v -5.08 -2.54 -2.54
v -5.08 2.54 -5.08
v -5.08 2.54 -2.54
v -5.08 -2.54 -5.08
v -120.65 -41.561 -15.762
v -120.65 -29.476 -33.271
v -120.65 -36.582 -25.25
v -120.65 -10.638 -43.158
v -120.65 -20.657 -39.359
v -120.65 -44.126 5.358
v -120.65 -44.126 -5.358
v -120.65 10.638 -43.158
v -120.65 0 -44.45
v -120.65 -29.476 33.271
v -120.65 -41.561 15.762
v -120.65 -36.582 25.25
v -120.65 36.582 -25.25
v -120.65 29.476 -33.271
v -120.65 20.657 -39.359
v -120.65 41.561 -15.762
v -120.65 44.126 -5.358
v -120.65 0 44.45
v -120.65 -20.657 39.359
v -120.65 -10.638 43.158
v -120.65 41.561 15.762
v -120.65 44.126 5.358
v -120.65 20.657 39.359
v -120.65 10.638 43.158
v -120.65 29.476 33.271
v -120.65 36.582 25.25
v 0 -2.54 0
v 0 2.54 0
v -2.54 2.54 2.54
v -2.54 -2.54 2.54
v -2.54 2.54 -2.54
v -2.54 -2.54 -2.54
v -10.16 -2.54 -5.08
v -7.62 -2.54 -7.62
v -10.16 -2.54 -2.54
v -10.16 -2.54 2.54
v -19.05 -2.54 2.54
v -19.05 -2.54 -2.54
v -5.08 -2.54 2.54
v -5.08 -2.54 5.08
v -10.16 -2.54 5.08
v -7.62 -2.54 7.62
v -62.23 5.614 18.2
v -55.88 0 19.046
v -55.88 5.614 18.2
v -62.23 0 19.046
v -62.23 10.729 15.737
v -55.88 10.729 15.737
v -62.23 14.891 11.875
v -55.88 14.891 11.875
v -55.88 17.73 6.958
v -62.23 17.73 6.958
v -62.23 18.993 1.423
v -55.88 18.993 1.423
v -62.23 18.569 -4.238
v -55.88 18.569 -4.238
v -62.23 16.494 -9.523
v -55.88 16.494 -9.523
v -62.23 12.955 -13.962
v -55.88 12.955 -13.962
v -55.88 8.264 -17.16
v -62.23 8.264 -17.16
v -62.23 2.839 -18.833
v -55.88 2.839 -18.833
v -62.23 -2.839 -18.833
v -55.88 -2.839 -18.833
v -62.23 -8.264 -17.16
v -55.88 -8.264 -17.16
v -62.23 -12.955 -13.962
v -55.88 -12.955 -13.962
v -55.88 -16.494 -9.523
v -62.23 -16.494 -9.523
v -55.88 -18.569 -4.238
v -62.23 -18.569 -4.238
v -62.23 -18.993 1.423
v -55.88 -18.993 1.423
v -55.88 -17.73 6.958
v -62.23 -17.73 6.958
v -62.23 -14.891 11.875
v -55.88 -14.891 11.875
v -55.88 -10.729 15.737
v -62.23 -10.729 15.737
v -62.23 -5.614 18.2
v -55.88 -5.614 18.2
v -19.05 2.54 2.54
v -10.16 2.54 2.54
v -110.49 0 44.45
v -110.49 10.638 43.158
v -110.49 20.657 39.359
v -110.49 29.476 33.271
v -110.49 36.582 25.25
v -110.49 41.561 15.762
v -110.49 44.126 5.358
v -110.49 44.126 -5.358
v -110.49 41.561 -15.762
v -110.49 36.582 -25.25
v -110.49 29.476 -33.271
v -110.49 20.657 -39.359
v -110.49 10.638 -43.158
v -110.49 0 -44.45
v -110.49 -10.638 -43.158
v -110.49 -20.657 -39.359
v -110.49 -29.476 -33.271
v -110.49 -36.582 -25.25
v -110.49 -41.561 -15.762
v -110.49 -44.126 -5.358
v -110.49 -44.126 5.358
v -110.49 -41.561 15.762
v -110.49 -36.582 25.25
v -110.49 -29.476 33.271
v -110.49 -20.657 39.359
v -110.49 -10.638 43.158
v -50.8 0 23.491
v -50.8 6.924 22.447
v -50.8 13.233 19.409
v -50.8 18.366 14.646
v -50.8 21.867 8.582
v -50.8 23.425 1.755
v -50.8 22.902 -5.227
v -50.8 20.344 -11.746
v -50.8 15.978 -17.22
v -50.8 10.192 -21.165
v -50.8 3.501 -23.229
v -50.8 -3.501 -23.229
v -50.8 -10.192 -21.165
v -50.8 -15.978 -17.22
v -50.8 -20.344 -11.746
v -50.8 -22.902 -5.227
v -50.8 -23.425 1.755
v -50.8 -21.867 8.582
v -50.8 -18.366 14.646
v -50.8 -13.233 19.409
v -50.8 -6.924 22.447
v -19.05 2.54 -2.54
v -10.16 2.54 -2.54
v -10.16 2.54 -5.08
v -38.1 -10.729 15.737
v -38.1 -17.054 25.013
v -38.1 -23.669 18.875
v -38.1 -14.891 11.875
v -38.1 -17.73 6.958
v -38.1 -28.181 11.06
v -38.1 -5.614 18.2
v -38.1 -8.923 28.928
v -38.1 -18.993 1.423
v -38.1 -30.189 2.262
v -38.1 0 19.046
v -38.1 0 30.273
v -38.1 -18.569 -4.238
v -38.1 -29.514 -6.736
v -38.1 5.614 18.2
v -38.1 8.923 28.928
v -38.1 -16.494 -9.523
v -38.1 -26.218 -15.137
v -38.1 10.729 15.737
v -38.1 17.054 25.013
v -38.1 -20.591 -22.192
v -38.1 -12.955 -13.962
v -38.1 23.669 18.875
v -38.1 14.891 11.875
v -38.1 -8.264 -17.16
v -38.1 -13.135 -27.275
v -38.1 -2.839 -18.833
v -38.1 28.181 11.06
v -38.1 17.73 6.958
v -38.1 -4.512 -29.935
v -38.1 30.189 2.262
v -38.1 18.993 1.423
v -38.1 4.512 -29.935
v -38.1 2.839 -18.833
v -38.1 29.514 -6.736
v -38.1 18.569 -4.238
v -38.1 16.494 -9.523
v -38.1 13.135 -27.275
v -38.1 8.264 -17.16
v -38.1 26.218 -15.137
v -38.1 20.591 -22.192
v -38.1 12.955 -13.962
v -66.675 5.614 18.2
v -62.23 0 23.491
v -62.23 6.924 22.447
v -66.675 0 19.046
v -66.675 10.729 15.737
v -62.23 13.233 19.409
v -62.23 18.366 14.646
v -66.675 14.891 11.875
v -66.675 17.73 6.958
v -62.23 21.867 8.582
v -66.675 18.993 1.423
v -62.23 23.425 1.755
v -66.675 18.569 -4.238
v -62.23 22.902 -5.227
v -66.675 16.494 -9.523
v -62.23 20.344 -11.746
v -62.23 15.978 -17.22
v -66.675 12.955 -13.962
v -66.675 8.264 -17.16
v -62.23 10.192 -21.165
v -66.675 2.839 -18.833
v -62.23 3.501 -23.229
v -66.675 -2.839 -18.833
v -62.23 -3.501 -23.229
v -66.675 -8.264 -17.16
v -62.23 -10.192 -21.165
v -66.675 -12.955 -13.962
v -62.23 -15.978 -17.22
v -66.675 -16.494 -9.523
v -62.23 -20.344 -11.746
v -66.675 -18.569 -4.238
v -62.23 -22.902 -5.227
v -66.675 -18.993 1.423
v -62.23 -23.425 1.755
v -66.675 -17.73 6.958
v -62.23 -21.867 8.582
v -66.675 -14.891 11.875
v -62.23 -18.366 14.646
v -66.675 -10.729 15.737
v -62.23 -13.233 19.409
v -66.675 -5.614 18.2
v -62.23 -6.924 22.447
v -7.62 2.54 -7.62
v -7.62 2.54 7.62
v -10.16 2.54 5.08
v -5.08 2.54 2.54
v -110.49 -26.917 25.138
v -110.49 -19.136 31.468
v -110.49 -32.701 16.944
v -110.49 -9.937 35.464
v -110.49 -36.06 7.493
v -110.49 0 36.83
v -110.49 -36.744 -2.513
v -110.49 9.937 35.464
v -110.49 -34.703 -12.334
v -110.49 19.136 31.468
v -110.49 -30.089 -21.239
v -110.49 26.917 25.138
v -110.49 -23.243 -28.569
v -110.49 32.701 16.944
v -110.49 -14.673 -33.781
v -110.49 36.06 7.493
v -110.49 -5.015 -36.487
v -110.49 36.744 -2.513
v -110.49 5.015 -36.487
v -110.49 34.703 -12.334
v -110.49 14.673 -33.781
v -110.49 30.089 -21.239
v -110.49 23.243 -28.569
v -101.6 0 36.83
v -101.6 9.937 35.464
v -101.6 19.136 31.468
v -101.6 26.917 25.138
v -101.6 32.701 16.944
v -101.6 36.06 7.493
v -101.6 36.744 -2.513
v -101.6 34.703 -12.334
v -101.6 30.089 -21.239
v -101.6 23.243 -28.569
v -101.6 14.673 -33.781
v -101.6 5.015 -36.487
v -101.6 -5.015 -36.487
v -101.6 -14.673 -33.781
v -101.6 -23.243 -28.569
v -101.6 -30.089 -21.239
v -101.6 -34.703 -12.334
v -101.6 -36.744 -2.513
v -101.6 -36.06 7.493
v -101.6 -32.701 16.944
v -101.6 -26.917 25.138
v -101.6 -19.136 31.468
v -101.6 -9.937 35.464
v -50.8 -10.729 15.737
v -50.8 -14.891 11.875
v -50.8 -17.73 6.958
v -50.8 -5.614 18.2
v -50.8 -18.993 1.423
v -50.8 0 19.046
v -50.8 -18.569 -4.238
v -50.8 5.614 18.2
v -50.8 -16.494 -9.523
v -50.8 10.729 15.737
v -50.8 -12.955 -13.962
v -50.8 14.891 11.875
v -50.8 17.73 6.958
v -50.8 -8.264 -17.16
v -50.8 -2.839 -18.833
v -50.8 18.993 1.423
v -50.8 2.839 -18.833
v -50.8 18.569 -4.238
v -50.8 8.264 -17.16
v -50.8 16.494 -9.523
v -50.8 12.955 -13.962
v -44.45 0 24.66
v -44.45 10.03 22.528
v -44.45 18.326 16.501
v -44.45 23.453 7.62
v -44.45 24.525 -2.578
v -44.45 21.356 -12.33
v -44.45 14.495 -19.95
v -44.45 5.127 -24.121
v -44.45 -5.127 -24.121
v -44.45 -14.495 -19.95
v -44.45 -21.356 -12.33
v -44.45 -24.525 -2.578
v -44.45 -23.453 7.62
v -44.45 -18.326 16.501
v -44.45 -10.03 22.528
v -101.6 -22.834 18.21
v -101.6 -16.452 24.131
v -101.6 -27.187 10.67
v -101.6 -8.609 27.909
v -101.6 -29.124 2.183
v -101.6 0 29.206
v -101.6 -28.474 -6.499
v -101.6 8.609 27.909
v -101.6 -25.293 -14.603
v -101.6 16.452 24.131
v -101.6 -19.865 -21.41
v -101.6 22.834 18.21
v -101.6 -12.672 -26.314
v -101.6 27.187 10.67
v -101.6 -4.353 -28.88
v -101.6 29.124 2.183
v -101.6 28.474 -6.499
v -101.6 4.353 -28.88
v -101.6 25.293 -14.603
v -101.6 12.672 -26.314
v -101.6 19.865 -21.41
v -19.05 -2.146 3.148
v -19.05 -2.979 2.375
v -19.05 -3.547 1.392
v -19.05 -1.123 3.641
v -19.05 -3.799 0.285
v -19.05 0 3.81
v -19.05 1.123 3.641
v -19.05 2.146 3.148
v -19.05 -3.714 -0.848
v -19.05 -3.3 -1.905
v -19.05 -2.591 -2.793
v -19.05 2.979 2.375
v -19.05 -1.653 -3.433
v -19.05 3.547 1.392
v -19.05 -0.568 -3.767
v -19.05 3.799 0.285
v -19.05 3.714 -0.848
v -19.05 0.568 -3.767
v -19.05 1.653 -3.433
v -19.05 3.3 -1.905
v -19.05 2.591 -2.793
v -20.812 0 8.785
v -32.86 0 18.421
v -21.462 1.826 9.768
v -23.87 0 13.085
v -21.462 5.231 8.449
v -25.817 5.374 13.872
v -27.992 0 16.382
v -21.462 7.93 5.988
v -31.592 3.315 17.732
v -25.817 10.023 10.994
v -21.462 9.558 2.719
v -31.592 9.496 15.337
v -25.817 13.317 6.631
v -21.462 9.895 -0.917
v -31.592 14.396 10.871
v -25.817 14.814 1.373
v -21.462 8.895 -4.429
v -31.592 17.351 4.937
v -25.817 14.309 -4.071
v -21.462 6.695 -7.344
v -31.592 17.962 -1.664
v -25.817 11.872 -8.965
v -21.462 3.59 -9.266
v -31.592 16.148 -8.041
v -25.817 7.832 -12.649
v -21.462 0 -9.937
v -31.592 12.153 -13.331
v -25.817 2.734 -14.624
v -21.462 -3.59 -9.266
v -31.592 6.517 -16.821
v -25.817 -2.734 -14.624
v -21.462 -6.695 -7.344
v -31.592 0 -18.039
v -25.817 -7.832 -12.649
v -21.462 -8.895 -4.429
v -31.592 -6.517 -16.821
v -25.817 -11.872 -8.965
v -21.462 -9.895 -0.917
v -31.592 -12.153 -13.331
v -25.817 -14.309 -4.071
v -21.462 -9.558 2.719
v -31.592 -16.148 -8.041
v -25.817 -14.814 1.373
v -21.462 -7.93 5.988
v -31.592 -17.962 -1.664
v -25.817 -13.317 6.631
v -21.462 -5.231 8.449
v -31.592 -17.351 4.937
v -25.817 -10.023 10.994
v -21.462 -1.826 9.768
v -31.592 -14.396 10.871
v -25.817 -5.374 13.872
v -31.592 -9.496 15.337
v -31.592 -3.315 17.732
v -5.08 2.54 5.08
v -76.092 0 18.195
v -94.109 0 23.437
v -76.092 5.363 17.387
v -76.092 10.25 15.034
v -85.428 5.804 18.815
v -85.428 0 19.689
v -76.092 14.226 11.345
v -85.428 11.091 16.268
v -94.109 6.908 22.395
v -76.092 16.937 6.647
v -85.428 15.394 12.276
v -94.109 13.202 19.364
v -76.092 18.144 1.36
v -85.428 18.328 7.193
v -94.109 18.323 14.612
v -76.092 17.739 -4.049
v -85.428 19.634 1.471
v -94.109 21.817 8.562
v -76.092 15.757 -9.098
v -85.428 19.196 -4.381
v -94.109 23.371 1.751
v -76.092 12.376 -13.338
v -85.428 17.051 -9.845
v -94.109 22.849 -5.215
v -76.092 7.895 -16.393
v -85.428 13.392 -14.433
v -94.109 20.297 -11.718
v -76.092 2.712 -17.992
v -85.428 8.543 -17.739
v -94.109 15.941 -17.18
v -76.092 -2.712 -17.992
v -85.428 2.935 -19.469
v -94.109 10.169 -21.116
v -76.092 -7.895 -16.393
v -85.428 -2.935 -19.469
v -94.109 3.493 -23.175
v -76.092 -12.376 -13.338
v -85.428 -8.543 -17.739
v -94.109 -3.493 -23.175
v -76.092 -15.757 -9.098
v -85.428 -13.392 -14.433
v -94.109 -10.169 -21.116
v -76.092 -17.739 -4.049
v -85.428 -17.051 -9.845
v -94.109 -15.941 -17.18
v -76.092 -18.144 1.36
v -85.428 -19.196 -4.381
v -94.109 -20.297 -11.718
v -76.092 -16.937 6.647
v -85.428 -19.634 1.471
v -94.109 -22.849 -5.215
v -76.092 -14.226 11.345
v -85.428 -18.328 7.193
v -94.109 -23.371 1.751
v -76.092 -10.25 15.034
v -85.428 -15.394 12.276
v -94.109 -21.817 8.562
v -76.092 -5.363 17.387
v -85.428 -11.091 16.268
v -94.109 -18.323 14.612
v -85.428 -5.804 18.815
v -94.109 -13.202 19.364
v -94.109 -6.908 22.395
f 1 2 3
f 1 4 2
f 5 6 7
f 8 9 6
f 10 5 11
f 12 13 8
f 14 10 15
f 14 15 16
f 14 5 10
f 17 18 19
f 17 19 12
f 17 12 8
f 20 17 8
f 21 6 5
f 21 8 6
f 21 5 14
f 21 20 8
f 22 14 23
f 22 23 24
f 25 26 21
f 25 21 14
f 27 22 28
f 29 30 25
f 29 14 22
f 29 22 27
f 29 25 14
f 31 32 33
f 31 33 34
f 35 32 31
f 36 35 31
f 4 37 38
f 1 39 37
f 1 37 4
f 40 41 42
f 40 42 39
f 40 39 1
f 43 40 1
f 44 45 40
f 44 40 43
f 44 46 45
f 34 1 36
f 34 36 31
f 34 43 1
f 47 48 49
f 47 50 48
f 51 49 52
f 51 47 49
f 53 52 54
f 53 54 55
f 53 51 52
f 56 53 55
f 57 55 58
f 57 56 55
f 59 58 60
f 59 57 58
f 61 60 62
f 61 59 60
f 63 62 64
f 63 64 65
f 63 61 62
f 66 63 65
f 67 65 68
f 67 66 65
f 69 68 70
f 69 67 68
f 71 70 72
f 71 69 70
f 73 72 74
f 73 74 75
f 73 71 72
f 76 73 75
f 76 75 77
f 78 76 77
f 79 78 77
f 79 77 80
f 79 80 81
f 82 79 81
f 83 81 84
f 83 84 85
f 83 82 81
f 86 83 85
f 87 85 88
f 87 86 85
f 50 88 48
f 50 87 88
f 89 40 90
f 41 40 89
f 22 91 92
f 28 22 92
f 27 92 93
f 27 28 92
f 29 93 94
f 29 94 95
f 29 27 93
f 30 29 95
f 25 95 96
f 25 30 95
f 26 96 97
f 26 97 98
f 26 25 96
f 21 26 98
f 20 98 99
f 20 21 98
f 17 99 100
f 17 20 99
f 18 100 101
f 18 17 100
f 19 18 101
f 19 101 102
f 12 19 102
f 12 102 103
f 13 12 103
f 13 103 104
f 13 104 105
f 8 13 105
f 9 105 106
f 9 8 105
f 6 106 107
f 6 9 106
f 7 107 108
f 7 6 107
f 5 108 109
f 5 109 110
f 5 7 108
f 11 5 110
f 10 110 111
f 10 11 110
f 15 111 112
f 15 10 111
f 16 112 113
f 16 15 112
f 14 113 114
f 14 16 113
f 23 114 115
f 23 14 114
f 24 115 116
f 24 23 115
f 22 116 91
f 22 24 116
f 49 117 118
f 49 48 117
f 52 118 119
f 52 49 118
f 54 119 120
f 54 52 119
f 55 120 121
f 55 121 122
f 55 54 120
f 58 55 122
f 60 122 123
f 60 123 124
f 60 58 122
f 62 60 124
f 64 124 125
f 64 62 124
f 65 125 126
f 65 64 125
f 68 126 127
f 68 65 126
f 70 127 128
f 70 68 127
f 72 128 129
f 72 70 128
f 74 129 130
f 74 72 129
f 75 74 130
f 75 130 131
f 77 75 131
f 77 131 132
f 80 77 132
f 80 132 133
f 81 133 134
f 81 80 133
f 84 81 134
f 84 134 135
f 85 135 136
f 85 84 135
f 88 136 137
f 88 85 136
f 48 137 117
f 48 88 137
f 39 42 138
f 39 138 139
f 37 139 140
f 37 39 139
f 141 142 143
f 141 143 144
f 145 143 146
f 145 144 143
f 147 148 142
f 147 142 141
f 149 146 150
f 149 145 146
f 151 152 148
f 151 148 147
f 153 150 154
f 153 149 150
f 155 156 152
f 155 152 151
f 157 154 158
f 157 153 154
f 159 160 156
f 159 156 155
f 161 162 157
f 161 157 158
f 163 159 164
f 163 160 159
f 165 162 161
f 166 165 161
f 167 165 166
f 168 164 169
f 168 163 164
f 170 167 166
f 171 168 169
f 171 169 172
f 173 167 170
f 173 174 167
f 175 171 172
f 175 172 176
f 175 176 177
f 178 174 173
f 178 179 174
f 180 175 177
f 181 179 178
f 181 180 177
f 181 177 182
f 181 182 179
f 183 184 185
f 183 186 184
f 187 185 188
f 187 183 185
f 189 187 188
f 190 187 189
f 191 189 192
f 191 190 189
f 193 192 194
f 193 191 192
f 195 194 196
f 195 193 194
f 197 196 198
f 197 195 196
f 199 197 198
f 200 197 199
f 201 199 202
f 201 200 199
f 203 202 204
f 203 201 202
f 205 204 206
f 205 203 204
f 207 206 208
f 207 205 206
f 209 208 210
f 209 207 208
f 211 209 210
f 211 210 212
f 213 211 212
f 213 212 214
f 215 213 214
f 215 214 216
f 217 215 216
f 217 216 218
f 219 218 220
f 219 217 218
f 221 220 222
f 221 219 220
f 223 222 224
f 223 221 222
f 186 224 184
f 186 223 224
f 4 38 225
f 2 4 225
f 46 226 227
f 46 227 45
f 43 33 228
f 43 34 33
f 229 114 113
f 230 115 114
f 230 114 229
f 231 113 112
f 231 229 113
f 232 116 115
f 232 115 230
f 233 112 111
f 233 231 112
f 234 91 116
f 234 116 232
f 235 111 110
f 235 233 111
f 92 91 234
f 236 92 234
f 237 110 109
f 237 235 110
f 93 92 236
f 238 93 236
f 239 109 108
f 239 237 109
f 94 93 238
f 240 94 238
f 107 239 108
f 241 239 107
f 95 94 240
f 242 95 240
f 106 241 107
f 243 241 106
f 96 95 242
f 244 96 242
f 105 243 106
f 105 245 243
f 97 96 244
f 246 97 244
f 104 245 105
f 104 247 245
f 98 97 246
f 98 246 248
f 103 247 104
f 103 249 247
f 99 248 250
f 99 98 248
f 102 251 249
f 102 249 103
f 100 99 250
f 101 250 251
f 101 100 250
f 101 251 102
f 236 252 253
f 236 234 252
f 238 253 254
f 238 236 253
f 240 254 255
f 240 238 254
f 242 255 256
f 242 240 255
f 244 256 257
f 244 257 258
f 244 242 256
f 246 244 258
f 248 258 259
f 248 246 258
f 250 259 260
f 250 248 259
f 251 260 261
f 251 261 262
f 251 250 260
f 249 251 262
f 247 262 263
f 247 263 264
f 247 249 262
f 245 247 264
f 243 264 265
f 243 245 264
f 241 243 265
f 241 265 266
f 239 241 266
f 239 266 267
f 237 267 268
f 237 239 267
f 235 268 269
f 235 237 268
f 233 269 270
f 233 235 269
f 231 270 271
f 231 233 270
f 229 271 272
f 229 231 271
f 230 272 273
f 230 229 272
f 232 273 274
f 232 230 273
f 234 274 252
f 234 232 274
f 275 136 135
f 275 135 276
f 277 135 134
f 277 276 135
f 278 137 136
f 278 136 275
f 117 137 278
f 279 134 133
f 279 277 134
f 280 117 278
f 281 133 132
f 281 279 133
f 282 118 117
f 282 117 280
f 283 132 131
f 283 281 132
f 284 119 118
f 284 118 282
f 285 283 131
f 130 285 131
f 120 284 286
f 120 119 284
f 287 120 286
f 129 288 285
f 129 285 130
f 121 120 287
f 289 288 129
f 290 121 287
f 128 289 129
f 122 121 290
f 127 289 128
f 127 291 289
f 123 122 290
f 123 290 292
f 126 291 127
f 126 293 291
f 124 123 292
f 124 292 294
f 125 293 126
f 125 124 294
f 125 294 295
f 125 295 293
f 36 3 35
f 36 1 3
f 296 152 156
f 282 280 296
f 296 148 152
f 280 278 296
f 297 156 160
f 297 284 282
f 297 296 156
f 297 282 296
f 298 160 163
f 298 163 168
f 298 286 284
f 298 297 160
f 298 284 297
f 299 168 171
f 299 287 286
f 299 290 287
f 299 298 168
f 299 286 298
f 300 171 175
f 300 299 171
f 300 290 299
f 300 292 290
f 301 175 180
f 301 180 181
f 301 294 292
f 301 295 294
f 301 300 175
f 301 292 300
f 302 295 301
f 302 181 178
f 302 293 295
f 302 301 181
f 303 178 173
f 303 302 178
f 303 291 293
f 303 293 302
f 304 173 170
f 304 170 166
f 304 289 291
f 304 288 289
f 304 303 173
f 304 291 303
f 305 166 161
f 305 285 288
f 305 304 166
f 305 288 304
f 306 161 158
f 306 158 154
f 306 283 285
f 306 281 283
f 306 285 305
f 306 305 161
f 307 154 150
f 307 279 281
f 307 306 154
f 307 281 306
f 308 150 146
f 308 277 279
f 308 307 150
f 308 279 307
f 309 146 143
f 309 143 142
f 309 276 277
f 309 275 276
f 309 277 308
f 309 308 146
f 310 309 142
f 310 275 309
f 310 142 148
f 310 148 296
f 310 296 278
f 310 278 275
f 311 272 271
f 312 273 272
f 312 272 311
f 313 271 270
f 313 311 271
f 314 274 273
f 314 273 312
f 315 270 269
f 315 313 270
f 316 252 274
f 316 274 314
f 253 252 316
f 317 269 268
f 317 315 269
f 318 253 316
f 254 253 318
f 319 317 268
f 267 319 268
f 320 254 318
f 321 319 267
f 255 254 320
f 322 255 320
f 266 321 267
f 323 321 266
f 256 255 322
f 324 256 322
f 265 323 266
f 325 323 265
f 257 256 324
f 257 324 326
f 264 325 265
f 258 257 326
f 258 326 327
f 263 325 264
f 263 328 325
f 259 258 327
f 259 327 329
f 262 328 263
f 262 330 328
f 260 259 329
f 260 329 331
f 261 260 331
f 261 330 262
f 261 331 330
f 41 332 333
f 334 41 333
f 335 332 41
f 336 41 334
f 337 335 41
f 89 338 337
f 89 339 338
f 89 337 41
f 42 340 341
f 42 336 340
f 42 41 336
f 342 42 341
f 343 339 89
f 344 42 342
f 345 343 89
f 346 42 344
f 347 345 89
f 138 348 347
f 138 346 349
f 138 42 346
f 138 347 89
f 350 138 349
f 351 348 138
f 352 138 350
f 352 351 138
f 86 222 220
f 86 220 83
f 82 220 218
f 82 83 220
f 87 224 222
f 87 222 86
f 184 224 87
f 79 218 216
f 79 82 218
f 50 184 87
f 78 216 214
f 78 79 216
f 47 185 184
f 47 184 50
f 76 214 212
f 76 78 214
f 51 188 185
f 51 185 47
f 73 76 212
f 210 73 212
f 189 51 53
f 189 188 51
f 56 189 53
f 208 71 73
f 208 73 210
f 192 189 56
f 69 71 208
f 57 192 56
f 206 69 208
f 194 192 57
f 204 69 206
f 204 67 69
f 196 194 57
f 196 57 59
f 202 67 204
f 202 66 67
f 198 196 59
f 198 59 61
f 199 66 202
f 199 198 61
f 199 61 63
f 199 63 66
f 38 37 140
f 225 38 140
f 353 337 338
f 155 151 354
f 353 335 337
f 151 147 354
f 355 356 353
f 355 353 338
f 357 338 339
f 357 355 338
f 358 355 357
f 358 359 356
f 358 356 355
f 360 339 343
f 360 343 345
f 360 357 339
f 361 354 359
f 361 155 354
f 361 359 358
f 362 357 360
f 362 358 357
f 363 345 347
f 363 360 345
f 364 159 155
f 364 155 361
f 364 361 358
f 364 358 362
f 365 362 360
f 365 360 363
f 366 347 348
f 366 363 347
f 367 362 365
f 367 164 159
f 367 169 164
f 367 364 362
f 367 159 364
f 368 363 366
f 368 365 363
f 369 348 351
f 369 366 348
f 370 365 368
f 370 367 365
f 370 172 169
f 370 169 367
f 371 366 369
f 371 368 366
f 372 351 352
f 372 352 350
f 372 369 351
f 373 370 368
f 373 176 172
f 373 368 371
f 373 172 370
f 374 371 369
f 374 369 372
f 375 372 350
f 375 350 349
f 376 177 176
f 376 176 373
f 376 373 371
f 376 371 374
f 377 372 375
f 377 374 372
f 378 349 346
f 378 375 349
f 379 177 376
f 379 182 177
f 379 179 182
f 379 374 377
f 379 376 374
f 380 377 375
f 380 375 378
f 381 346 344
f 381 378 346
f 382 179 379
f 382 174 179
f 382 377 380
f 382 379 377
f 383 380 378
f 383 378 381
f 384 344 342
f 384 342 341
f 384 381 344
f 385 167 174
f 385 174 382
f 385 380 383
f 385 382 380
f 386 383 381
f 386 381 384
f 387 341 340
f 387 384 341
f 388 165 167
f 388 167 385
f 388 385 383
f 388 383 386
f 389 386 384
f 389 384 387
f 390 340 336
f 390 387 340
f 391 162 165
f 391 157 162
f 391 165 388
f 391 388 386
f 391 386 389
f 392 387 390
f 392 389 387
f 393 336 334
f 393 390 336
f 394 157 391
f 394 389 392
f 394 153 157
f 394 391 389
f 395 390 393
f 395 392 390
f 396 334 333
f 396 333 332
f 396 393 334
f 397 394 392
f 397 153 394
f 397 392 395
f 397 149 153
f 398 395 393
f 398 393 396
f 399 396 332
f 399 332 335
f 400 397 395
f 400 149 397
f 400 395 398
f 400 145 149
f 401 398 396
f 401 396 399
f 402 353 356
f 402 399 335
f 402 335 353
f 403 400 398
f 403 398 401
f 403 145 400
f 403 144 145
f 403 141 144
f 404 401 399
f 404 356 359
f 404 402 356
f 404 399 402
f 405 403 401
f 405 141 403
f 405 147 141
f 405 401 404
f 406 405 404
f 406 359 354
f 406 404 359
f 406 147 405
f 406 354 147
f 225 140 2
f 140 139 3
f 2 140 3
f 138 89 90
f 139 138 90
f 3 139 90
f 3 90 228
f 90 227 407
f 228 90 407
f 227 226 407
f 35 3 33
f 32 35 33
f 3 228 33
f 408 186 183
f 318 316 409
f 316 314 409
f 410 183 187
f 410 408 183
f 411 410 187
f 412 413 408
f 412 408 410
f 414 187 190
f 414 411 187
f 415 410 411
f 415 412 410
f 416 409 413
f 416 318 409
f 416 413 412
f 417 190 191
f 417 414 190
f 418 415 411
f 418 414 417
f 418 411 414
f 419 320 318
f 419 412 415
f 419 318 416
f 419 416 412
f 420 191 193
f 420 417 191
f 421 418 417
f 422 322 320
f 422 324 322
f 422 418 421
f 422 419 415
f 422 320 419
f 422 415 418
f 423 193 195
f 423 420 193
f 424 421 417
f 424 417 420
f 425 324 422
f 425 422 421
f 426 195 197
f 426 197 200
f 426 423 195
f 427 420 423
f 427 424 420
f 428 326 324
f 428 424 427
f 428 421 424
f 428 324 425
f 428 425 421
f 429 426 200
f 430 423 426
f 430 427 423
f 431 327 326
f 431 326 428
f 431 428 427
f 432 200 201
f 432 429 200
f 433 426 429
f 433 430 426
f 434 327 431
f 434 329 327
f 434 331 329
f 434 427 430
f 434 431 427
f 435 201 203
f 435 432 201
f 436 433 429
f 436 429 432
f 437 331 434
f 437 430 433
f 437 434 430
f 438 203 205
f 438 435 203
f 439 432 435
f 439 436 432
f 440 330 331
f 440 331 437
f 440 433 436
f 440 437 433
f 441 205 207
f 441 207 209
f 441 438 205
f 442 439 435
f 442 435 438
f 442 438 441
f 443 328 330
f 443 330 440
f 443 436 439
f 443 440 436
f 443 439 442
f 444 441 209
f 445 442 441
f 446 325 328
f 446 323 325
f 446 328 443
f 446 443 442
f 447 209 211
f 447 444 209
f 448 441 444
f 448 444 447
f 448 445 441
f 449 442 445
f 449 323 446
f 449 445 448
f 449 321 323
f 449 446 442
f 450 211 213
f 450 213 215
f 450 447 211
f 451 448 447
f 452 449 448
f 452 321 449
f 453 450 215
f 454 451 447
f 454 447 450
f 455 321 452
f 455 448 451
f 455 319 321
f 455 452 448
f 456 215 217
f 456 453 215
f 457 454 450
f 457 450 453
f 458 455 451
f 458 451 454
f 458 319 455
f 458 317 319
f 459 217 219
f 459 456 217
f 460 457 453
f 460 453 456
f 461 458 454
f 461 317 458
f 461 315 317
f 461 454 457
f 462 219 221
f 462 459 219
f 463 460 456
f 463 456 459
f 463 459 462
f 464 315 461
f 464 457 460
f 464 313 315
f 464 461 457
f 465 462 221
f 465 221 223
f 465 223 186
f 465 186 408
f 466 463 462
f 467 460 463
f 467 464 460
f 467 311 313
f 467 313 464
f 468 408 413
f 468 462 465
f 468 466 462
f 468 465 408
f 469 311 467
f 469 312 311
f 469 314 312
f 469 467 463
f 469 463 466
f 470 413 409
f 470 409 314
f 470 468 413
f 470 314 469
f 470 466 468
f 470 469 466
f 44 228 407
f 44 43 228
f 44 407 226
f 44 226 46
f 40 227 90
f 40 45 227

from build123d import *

# Parameters (mm, degrees)
F0_W          = 5.08
F0_H          = 5.08
F2_DEPTH      = 2.54
F2_DEPTH_BACK = 2.54
F3_SIZE2      = 2.53999
F3_SIZE       = 2.53999


# Not quite as in the source:
# - a fillet or chamfer is up to 0.001 mm smaller than in the source, because OpenCascade refuses the exact size


with BuildPart() as f1:
    # F0 (on Front) → F1 (revolve)
    with BuildSketch(Plane.XZ):
        with BuildLine():
            Line((-120.65, 0), (-19.05, 0))
            Line((-19.05, 0), (-19.05, 2.54))
            Line((-19.05, 2.54), (-19.05, 3.81))
            ThreePointArc((-19.05, 3.81), (-25.8165229562, 14.8770320486), (-38.1, 19.0461114431))
            Line((-38.1, 19.0461114431), (-38.1, 30.2734401025))
            Line((-38.1, 30.2734401025), (-50.8, 19.0461114431))
            Line((-50.8, 19.0461114431), (-50.8, 23.4911114431))
            Line((-50.8, 23.4911114431), (-55.88, 19.0461114431))
            Line((-55.88, 19.0461114431), (-62.23, 19.0461114431))
            Line((-62.23, 19.0461114431), (-62.23, 23.4911114431))
            Line((-62.23, 23.4911114431), (-66.675, 19.0461114431))
            ThreePointArc((-66.675, 19.0461114431), (-85.4281931482, 19.6893537461), (-101.6, 29.2061114431))
            Line((-101.6, 29.2061114431), (-101.6, 36.83))
            Line((-101.6, 36.83), (-110.49, 36.83))
            Line((-110.49, 36.83), (-110.49, 44.45))
            Line((-110.49, 44.45), (-120.65, 44.45))
            Line((-120.65, 44.45), (-120.65, 0))
        make_face()
    revolve(axis=Axis((-69.85, 0, 0), (-1, 0, 0)))

    # F0 (on Front) → F2 (join, two sides)
    with BuildSketch(Plane.XZ) as f2_sk:
        with Locations((-2.54, 0)):
            Rectangle(F0_W, F0_H)
        with Locations((-7.62, -5.08)):
            Rectangle(F0_W, F0_H)
        with Locations((-7.62, 0)):
            Rectangle(F0_W, F0_H)
        with Locations((-7.62, 5.08)):
            Rectangle(F0_W, F0_H)
        Polygon((-19.05, 2.54), (-19.05, 0), (-19.05, -2.54), (-10.16, -2.54), (-10.16, 2.54), align=None)
    extrude(amount=F2_DEPTH)
    extrude(f2_sk.sketch, amount=-F2_DEPTH_BACK)

    # F3 (size 2.54 and 2.54 in the source; OpenCascade refuses exactly that, so slightly less here)
    f3_edges = [f1.edges().sort_by_distance(p)[0] for p in [
        (-10.16, 0, 7.62),
        (-5.08, 0, 7.62),
        (0, 0, 2.54),
        (0, 0, -2.54),
        (-5.08, 0, -7.62),
        (-10.16, 0, -7.62),
    ]]
    chamfer(f3_edges, length=F3_SIZE, length2=F3_SIZE2)


solid = f1.part
